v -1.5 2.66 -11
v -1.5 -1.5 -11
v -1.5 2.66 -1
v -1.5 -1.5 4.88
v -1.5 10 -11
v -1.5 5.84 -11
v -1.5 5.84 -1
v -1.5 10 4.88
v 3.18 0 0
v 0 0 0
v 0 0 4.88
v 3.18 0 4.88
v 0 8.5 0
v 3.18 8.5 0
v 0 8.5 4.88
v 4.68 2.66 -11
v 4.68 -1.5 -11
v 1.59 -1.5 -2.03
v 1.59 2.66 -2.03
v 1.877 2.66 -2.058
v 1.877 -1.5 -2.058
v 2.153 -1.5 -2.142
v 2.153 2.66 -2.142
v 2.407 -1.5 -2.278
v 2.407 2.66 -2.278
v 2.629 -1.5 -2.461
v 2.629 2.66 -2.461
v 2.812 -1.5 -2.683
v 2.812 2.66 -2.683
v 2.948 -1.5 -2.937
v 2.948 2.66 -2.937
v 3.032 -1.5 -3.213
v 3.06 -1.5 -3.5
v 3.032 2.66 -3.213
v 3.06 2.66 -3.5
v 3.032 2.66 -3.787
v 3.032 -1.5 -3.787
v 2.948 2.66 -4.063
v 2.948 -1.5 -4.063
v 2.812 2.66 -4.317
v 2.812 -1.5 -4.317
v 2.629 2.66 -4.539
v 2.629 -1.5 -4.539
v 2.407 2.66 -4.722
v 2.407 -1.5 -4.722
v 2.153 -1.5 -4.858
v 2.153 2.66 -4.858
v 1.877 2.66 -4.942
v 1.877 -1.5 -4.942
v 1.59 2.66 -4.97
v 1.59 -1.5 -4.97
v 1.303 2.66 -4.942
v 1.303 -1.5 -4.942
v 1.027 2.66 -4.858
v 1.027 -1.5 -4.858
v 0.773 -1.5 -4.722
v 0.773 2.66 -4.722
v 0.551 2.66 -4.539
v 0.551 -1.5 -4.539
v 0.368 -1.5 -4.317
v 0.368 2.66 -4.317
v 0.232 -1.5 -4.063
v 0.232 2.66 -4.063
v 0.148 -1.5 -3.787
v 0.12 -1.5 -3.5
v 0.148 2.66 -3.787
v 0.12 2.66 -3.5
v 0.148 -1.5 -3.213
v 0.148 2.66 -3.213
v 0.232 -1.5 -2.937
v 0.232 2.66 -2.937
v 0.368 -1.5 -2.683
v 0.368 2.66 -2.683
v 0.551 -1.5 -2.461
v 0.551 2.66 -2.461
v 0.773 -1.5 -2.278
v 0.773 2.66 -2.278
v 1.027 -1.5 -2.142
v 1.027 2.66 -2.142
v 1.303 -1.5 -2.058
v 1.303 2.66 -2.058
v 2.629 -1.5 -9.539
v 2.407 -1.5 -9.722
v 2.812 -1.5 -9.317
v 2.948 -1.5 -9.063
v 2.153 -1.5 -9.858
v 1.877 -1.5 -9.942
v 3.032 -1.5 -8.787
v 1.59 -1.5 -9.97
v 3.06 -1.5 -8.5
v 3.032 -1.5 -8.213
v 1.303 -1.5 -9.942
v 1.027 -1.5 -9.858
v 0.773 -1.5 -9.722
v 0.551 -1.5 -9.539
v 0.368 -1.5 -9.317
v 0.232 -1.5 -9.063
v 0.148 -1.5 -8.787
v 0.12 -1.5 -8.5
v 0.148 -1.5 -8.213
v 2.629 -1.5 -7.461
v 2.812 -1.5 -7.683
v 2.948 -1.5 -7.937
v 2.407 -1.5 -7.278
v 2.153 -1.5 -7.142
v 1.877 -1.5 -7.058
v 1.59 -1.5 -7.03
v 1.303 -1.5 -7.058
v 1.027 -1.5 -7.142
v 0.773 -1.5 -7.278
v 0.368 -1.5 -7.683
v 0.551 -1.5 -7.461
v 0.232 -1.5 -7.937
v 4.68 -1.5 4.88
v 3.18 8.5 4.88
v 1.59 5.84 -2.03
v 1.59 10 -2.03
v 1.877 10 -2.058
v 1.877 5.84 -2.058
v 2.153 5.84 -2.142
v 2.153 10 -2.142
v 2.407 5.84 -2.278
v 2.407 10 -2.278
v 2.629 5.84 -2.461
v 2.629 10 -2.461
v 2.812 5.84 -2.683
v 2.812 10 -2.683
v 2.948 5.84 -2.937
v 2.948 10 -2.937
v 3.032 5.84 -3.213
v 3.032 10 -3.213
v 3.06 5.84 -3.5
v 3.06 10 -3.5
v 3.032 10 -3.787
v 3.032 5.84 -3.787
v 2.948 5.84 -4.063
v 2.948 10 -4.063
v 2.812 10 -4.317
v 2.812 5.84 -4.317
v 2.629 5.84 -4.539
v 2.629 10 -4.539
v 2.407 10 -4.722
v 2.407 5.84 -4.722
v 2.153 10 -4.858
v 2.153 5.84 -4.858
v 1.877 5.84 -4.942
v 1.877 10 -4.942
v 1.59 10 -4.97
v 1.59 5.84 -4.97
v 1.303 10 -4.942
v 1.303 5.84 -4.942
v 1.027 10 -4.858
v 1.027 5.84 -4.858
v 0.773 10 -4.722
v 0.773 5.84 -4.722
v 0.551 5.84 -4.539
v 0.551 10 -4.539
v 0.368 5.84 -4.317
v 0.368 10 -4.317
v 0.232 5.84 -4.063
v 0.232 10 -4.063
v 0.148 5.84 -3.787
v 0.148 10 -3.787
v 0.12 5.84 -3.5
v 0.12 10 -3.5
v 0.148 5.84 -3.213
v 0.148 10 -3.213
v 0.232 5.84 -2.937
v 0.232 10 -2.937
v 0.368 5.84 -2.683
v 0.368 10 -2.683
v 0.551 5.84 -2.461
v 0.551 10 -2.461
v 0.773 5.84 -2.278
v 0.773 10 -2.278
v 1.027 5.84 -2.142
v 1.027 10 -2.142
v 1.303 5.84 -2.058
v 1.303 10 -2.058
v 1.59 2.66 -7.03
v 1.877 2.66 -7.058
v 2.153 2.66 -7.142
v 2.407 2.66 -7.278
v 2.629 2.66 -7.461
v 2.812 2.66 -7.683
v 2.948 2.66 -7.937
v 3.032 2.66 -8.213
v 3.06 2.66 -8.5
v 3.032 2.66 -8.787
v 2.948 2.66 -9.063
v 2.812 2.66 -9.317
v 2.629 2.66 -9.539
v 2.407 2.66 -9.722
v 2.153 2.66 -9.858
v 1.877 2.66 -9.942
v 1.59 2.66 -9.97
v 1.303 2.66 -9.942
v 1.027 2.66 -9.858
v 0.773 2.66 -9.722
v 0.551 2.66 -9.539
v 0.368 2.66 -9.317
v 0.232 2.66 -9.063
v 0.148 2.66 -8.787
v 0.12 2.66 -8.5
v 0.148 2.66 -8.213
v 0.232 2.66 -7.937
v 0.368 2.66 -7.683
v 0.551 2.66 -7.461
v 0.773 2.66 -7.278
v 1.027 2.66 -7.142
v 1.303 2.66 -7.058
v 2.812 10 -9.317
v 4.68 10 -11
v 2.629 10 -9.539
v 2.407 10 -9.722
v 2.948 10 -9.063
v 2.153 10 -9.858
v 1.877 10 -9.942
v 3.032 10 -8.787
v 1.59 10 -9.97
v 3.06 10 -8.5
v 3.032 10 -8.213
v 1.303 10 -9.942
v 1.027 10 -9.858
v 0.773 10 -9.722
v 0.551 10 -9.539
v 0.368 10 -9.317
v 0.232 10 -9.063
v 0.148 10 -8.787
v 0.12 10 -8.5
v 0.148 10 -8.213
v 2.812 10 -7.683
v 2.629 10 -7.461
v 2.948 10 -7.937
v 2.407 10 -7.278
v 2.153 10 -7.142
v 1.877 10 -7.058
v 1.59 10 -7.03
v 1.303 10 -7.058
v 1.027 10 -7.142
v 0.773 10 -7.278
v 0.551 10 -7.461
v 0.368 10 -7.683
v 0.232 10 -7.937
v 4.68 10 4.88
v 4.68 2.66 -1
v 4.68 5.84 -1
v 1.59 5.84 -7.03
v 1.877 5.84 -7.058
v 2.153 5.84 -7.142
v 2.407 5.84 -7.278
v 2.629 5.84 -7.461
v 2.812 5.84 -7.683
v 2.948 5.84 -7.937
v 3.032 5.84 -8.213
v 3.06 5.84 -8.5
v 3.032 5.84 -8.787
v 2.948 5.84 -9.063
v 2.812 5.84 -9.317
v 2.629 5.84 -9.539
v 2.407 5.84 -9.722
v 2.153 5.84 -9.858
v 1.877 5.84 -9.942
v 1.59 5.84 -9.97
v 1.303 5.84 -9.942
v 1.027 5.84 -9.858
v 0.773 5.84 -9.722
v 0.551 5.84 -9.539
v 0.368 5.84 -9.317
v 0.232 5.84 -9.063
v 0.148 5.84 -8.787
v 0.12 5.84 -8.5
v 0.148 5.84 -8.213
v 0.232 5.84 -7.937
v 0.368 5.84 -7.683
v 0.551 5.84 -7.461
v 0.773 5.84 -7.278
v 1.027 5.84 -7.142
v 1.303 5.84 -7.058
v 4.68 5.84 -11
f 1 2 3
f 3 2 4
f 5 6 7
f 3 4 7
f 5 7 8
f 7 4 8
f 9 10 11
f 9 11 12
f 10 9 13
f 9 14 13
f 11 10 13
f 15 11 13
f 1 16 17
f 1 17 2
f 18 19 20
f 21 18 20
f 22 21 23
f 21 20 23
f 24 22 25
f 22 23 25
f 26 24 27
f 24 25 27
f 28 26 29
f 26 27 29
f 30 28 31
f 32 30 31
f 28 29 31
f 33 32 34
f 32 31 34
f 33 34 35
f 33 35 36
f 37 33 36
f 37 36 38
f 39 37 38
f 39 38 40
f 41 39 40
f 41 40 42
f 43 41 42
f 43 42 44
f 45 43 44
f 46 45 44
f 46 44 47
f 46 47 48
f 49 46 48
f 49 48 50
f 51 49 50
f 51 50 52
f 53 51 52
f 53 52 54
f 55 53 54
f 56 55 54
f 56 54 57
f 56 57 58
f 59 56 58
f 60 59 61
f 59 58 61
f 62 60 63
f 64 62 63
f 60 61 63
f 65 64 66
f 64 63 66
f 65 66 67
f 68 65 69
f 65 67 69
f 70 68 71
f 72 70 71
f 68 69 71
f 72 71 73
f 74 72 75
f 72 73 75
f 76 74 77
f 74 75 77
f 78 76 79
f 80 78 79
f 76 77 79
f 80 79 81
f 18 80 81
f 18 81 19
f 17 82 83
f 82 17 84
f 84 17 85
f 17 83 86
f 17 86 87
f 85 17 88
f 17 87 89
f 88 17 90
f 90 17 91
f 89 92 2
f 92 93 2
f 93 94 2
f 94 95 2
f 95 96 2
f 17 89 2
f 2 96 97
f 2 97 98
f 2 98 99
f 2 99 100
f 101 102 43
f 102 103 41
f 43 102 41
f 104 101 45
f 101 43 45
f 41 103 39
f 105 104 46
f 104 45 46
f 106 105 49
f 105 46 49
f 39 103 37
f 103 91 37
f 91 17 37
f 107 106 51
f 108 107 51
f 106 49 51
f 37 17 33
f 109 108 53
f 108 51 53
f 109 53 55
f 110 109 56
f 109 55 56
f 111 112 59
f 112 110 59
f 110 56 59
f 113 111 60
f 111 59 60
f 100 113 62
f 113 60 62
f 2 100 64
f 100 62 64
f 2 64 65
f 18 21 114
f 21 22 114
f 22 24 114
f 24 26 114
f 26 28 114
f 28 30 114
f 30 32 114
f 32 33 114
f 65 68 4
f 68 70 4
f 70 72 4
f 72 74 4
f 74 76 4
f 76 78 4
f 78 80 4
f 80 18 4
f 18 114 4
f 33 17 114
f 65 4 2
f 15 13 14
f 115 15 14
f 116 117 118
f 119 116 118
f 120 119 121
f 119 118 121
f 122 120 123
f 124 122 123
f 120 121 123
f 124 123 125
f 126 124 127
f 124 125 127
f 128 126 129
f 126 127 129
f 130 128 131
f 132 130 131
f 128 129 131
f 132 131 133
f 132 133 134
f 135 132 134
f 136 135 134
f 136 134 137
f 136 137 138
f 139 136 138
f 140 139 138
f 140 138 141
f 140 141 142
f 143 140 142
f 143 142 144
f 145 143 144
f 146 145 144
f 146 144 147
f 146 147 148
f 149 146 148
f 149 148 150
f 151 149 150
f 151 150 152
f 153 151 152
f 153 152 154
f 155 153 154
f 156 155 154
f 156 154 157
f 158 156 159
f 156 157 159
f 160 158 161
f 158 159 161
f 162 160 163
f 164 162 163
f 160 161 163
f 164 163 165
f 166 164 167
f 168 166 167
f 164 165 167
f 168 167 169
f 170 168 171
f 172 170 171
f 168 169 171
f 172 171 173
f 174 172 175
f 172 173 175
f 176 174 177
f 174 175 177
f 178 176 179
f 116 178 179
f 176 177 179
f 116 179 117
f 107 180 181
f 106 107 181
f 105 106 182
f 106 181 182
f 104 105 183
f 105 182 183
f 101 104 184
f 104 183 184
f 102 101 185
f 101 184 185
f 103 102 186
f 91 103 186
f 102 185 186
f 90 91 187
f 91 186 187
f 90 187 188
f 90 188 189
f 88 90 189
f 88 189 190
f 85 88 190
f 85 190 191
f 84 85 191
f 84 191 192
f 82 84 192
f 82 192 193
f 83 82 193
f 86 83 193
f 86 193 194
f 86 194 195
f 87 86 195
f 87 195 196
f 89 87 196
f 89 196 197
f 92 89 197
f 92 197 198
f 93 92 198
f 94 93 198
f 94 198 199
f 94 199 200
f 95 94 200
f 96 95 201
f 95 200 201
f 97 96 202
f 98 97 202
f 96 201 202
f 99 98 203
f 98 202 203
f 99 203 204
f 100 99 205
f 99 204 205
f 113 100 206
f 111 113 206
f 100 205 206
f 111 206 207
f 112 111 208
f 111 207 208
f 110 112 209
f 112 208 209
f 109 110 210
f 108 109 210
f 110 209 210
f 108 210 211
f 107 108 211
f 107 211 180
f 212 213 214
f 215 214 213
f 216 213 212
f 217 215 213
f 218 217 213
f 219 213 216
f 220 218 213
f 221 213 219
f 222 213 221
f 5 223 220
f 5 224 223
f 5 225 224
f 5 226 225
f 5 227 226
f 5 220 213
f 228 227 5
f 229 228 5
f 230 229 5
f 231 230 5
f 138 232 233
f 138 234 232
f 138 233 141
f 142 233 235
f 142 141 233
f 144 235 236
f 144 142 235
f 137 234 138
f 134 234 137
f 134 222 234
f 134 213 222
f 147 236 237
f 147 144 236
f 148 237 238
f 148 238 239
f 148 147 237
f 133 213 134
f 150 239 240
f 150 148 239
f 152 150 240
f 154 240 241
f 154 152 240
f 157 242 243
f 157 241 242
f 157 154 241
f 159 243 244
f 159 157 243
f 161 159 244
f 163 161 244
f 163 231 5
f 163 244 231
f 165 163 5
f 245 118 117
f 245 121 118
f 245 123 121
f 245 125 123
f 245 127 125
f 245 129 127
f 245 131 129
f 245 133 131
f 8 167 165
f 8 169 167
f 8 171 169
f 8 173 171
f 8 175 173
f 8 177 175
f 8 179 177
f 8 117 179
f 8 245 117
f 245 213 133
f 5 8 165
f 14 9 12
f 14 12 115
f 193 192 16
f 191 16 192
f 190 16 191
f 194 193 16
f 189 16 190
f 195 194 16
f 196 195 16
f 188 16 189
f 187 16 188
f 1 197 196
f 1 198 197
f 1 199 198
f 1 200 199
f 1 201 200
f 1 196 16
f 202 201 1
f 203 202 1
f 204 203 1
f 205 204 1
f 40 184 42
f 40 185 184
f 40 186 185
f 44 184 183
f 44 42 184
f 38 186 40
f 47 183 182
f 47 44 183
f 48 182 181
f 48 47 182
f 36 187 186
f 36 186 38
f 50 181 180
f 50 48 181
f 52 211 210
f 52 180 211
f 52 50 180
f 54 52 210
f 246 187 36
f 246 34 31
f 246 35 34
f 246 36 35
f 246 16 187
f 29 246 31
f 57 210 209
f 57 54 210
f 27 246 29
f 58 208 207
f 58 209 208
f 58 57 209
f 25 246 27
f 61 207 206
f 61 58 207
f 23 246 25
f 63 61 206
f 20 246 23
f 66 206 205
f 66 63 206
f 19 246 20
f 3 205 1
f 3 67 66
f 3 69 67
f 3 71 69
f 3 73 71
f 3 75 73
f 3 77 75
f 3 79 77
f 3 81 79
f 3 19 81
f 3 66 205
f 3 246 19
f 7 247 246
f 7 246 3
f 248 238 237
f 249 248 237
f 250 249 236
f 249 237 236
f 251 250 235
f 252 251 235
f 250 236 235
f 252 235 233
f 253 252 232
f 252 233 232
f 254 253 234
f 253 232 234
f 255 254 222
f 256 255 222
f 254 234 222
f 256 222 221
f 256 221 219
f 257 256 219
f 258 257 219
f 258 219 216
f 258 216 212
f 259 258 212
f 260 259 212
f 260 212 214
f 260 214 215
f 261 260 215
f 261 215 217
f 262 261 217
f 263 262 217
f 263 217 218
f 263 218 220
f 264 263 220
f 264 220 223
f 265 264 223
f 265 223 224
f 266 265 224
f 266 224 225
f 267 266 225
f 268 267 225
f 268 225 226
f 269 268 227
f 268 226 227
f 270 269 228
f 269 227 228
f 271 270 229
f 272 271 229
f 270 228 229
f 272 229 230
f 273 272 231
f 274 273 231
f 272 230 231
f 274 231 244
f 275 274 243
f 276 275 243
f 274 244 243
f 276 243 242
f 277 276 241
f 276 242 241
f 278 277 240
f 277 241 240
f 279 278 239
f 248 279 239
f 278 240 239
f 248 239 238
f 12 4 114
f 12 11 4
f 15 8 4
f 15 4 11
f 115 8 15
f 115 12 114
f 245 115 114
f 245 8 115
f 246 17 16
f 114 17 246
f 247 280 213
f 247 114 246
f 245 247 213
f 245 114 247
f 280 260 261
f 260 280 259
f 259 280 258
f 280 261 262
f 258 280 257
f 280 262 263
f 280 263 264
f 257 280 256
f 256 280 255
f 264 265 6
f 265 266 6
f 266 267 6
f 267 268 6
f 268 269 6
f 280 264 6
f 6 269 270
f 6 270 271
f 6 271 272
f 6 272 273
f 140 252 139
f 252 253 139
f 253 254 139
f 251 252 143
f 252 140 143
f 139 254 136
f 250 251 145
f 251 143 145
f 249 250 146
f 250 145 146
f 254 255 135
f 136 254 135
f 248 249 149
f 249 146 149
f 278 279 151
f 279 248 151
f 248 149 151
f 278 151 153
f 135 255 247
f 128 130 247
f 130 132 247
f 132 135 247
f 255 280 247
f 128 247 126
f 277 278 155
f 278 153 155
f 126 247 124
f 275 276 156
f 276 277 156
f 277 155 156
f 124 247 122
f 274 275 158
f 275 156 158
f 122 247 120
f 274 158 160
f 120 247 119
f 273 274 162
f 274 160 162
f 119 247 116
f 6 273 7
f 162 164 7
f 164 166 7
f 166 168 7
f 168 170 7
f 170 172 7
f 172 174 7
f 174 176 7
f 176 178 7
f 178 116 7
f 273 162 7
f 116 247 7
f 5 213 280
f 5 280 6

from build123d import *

# Parameters (mm, degrees)
SKETCH1_W           = 6.18
SKETCH1_H           = 11.5
SKETCH1_W_2         = 3.18
SKETCH1_H_2         = 8.5
BOSS_EXTRUDE1_DEPTH = 4.88
SKETCH2_W           = 6.18
SKETCH2_H           = 11.5
BOSS_EXTRUDE2_DEPTH = 1
SKETCH3_W           = 6.18
SKETCH3_H           = 4.16
BOSS_EXTRUDE3_DEPTH = 10
SKETCH4_R           = 1.47
CUT_EXTRUDE1_DEPTH  = 17.587718348


with BuildPart() as part:
    # Sketch1 → Boss-Extrude1 (new body)
    with BuildSketch(Plane.XY):
        with Locations((1.59, 4.25)):
            Rectangle(SKETCH1_W, SKETCH1_H)
        with Locations((1.59, 4.25)):
            Rectangle(SKETCH1_W_2, SKETCH1_H_2, mode=Mode.SUBTRACT)
    extrude(amount=BOSS_EXTRUDE1_DEPTH)

    # Sketch2 → Boss-Extrude2 (add)
    with BuildSketch(Plane(origin=(0, 0, 0), x_dir=(-1, 0, 0), z_dir=(0, 0, -1))):
        with Locations((-1.59, 4.25)):
            Rectangle(SKETCH2_W, SKETCH2_H)
    extrude(amount=BOSS_EXTRUDE2_DEPTH)

    # Sketch3 → Boss-Extrude3 (add)
    with BuildSketch(Plane(origin=(0, 0, -1), x_dir=(-1, 0, 0), z_dir=(0, 0, -1))):
        with Locations((-1.59, 7.92)):
            Rectangle(SKETCH3_W, SKETCH3_H)
        with Locations((-1.59, 0.58)):
            Rectangle(SKETCH3_W, SKETCH3_H)
    extrude(amount=BOSS_EXTRUDE3_DEPTH)

    # Sketch4 → Cut-Extrude1 (cut, through all)
    with BuildSketch(Plane(origin=(0, 10, 0), x_dir=(1, 0, 0), z_dir=(0, 1, 0))):
        with Locations(Location((1.59, 3.5, 0), (0, 0, 270))):
            Circle(SKETCH4_R)
        with Locations(Location((1.59, 8.5, 0), (0, 0, 270))):
            Circle(SKETCH4_R)
    extrude(amount=-CUT_EXTRUDE1_DEPTH, mode=Mode.SUBTRACT)


solid = part.part
